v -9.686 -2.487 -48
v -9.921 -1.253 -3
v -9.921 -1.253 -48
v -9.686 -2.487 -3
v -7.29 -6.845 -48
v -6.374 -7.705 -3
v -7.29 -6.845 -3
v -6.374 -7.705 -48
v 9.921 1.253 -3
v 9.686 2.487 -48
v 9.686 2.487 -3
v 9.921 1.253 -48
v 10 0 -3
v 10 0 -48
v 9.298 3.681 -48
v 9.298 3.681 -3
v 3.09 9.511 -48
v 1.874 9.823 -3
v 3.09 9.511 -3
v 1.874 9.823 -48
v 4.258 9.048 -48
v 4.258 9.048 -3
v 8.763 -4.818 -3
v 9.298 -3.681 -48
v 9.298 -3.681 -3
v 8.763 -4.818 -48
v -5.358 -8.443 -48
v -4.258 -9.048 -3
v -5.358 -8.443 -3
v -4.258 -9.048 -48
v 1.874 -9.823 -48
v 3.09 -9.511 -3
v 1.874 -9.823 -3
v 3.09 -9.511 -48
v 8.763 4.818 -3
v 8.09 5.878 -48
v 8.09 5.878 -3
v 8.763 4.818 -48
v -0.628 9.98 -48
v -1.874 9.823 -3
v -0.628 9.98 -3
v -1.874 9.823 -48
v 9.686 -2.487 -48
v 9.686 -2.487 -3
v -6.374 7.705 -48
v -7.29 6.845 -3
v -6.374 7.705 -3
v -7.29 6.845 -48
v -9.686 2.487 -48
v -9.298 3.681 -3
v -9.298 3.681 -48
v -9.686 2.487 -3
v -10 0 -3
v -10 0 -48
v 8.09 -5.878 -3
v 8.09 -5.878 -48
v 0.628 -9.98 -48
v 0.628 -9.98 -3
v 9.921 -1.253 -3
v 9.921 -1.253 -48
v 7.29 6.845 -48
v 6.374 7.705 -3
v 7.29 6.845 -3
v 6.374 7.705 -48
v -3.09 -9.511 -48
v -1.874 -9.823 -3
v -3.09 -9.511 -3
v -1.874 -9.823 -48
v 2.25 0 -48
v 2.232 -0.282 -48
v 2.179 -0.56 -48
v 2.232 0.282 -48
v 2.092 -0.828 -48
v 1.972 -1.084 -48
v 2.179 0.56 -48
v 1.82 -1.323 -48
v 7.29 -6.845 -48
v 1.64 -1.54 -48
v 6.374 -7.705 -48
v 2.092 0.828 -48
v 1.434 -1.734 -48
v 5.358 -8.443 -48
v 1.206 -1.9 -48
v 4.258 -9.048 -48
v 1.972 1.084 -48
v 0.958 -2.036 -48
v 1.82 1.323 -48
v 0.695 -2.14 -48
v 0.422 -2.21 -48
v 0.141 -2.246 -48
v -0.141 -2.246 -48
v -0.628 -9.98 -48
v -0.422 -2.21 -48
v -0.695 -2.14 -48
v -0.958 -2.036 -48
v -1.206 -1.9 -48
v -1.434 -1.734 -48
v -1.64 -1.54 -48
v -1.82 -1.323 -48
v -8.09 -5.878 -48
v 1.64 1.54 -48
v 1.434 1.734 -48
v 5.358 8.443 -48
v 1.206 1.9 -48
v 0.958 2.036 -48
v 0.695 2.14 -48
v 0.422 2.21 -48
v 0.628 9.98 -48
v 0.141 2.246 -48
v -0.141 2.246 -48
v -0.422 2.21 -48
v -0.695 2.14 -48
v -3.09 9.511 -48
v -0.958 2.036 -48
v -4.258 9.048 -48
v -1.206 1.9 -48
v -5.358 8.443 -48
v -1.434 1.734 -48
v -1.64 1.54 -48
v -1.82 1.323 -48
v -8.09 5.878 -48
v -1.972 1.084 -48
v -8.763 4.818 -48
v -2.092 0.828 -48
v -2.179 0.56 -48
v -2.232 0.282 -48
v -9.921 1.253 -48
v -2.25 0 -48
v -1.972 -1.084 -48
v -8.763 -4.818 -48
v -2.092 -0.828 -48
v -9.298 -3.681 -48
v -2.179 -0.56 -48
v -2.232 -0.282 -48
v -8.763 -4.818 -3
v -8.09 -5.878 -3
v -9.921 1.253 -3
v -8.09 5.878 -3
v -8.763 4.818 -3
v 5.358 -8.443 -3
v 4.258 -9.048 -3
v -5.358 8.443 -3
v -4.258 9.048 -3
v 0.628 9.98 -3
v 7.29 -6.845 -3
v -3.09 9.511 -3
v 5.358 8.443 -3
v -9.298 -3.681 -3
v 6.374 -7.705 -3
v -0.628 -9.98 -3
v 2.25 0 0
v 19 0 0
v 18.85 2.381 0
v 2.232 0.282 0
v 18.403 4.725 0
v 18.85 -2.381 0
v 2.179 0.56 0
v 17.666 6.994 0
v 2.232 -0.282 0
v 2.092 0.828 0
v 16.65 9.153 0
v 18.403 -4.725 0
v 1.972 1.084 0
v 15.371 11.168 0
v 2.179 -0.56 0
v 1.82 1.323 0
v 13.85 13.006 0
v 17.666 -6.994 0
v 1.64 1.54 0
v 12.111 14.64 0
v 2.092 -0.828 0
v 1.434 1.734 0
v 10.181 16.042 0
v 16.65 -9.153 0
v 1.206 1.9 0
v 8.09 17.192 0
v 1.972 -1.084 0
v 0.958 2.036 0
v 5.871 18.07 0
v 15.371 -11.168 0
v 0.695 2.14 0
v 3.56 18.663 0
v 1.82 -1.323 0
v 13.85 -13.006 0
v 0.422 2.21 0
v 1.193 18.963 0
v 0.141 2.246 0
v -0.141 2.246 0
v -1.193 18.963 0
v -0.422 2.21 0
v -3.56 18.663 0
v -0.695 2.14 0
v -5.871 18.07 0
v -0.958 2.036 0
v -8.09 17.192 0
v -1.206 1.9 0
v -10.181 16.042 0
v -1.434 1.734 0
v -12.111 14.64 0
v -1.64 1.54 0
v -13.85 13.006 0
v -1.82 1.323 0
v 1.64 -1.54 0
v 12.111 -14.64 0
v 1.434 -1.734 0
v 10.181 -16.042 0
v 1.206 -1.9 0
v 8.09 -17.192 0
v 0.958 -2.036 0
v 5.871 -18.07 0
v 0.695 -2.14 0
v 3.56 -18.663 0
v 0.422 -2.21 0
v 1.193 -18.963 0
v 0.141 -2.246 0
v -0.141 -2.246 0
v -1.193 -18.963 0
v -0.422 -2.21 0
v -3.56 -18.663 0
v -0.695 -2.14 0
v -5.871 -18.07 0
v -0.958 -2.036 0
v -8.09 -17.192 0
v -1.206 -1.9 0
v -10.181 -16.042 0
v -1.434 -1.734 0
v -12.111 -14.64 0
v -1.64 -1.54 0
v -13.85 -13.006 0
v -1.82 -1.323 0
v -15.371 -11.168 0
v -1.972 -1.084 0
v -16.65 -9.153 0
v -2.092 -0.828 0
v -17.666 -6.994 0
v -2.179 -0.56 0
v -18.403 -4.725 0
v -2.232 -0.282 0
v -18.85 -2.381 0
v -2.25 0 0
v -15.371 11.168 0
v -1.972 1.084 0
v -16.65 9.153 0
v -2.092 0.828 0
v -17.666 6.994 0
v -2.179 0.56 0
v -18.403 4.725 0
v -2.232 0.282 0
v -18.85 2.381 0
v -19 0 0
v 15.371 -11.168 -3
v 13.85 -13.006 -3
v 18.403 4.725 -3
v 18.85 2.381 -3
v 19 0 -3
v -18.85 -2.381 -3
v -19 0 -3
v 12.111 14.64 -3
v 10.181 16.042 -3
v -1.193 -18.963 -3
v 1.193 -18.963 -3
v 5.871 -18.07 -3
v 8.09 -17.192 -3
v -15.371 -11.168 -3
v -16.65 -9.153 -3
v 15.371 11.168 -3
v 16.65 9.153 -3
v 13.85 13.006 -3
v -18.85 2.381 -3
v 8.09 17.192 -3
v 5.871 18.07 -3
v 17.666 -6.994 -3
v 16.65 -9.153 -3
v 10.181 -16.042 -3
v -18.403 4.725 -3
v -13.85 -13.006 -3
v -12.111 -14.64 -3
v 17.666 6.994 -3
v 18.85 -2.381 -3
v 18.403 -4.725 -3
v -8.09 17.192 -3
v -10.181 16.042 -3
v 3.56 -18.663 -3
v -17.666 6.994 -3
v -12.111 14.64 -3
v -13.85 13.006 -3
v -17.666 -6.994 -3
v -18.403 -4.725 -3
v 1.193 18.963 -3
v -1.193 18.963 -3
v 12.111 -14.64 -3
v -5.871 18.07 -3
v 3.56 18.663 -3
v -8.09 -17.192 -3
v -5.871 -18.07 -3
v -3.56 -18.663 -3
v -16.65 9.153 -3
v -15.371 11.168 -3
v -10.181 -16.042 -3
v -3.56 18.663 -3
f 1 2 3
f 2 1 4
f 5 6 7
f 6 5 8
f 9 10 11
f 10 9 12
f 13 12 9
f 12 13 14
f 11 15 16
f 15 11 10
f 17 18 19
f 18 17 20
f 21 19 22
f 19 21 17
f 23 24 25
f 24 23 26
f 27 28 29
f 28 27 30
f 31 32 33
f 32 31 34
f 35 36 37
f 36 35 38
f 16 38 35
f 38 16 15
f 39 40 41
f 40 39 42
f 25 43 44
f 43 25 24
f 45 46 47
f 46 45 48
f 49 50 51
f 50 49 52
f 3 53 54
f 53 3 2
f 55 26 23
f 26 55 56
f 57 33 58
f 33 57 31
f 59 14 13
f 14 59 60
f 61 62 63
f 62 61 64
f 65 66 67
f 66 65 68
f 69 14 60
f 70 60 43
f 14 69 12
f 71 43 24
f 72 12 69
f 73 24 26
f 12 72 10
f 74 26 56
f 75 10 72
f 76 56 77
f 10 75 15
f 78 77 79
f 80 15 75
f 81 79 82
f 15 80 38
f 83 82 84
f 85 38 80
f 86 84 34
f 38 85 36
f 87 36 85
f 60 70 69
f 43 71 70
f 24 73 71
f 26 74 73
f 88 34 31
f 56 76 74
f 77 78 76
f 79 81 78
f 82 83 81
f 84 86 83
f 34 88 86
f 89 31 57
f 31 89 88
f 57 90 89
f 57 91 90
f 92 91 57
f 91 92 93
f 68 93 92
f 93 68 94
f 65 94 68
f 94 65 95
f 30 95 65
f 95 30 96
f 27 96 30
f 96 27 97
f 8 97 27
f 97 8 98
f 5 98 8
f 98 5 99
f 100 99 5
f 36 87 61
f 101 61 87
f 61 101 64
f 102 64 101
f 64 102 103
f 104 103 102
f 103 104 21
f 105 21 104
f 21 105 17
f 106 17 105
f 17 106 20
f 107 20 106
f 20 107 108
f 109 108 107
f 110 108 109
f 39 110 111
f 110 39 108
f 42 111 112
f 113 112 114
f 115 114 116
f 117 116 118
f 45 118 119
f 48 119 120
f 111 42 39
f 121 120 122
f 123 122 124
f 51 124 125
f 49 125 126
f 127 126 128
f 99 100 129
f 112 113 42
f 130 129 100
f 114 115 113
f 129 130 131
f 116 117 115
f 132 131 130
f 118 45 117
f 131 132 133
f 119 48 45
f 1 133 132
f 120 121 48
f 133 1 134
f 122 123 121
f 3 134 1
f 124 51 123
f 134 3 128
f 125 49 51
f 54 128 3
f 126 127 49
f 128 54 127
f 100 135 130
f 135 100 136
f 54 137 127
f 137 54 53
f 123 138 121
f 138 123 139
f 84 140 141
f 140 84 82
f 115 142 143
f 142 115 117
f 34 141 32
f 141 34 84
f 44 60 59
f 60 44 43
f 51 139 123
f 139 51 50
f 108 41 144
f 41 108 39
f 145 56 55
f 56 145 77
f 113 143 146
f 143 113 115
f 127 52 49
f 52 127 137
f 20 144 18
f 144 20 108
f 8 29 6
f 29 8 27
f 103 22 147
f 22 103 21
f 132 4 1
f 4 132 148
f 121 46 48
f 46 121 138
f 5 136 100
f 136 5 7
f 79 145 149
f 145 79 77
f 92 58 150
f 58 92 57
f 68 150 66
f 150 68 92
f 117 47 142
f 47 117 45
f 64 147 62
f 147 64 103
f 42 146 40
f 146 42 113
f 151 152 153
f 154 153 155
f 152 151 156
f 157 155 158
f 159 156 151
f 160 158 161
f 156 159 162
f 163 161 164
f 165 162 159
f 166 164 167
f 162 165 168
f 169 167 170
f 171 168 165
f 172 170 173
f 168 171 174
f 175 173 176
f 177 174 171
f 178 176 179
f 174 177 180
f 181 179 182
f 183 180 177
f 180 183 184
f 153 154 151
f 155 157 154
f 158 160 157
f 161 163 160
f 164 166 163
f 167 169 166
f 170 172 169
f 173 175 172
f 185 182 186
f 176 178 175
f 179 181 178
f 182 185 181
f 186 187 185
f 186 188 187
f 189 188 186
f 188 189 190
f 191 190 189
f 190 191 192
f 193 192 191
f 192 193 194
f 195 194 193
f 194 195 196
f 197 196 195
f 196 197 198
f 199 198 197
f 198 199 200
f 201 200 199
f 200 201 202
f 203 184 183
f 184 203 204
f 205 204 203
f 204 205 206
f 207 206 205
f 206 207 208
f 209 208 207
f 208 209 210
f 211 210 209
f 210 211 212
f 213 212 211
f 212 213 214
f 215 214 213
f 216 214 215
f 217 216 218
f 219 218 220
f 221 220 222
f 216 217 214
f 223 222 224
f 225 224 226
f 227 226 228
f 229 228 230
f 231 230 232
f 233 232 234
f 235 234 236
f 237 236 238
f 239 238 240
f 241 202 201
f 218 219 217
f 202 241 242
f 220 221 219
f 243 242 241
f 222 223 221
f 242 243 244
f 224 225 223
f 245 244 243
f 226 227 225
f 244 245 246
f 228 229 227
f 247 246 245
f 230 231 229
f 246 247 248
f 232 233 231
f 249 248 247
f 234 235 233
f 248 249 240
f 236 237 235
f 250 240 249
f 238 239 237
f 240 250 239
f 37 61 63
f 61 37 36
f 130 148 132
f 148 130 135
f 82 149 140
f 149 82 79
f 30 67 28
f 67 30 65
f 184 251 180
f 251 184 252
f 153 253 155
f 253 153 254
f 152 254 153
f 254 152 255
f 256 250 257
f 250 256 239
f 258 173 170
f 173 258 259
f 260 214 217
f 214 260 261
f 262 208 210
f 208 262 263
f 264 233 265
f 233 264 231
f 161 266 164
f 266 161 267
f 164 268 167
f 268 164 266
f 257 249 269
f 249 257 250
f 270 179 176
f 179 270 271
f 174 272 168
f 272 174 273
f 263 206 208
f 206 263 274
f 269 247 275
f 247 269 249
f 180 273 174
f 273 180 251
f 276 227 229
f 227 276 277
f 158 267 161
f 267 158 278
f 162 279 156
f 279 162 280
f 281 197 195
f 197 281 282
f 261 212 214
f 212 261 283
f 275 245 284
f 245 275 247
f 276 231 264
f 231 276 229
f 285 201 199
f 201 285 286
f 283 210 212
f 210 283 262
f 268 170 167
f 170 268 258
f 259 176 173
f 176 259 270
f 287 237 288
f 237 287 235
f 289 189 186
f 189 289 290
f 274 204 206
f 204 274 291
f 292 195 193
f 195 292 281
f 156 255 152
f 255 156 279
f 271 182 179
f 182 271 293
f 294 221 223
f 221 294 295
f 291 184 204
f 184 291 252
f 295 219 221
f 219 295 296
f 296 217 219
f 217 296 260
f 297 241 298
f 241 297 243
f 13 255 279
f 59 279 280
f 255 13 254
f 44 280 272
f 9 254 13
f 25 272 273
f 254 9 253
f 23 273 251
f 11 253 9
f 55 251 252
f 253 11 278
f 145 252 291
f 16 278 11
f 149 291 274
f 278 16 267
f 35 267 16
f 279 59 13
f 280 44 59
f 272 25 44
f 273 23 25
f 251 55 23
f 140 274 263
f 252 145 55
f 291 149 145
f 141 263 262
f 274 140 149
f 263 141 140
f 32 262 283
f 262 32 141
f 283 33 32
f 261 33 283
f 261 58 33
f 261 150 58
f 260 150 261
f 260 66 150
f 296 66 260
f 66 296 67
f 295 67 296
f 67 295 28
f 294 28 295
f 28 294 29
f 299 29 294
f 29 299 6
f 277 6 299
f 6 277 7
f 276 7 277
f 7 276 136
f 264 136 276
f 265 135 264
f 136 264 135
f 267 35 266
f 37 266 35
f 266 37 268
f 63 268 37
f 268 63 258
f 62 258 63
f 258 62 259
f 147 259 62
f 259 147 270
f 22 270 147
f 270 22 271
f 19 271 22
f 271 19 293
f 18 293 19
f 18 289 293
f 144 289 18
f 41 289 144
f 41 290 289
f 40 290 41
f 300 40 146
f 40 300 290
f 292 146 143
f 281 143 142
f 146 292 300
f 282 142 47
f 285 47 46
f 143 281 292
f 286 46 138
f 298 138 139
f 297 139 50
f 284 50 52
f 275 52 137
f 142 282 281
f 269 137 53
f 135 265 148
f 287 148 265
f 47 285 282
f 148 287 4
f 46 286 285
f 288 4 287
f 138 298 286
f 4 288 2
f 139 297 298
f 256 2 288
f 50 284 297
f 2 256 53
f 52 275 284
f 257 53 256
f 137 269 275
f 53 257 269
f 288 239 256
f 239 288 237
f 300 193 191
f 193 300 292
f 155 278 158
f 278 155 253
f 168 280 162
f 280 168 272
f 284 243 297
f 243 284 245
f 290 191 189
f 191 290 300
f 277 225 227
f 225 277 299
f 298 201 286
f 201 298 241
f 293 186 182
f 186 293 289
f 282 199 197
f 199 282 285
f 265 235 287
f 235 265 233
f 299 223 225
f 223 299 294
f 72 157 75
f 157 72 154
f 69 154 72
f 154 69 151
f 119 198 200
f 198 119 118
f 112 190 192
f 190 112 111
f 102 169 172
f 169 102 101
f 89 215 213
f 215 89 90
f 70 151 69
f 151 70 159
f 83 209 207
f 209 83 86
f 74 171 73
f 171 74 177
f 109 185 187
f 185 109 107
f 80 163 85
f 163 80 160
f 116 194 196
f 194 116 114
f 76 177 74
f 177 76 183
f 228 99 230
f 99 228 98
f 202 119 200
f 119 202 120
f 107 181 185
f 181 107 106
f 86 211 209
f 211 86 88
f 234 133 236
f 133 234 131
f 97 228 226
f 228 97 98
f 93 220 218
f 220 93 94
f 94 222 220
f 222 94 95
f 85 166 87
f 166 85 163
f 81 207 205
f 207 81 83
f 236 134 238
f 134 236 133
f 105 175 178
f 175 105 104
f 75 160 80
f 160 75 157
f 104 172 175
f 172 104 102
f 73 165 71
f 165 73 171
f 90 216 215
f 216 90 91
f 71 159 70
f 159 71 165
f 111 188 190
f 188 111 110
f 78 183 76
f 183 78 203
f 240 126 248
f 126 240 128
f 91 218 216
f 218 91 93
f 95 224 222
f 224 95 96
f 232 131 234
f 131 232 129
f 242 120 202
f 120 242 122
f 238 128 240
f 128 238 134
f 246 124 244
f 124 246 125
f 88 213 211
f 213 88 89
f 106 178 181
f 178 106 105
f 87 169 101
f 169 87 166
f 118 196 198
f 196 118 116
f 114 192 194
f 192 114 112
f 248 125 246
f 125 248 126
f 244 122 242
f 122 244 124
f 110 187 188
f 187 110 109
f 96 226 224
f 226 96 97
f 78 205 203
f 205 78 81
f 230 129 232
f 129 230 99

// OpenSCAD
$fn = 50;


difference() {
	union() {
		translate(v = [0, 0, -48.0000000000]) {
			cylinder(h = 48, r = 10.0000000000);
		}
		translate(v = [0, 0, -3.0000000000]) {
			cylinder(h = 3, r = 19.0000000000);
		}
	}
	union() {
		#translate(v = [0, 0, -48]) {
			cylinder(h = 48, r = 2.2500000000);
		}
	}
}
